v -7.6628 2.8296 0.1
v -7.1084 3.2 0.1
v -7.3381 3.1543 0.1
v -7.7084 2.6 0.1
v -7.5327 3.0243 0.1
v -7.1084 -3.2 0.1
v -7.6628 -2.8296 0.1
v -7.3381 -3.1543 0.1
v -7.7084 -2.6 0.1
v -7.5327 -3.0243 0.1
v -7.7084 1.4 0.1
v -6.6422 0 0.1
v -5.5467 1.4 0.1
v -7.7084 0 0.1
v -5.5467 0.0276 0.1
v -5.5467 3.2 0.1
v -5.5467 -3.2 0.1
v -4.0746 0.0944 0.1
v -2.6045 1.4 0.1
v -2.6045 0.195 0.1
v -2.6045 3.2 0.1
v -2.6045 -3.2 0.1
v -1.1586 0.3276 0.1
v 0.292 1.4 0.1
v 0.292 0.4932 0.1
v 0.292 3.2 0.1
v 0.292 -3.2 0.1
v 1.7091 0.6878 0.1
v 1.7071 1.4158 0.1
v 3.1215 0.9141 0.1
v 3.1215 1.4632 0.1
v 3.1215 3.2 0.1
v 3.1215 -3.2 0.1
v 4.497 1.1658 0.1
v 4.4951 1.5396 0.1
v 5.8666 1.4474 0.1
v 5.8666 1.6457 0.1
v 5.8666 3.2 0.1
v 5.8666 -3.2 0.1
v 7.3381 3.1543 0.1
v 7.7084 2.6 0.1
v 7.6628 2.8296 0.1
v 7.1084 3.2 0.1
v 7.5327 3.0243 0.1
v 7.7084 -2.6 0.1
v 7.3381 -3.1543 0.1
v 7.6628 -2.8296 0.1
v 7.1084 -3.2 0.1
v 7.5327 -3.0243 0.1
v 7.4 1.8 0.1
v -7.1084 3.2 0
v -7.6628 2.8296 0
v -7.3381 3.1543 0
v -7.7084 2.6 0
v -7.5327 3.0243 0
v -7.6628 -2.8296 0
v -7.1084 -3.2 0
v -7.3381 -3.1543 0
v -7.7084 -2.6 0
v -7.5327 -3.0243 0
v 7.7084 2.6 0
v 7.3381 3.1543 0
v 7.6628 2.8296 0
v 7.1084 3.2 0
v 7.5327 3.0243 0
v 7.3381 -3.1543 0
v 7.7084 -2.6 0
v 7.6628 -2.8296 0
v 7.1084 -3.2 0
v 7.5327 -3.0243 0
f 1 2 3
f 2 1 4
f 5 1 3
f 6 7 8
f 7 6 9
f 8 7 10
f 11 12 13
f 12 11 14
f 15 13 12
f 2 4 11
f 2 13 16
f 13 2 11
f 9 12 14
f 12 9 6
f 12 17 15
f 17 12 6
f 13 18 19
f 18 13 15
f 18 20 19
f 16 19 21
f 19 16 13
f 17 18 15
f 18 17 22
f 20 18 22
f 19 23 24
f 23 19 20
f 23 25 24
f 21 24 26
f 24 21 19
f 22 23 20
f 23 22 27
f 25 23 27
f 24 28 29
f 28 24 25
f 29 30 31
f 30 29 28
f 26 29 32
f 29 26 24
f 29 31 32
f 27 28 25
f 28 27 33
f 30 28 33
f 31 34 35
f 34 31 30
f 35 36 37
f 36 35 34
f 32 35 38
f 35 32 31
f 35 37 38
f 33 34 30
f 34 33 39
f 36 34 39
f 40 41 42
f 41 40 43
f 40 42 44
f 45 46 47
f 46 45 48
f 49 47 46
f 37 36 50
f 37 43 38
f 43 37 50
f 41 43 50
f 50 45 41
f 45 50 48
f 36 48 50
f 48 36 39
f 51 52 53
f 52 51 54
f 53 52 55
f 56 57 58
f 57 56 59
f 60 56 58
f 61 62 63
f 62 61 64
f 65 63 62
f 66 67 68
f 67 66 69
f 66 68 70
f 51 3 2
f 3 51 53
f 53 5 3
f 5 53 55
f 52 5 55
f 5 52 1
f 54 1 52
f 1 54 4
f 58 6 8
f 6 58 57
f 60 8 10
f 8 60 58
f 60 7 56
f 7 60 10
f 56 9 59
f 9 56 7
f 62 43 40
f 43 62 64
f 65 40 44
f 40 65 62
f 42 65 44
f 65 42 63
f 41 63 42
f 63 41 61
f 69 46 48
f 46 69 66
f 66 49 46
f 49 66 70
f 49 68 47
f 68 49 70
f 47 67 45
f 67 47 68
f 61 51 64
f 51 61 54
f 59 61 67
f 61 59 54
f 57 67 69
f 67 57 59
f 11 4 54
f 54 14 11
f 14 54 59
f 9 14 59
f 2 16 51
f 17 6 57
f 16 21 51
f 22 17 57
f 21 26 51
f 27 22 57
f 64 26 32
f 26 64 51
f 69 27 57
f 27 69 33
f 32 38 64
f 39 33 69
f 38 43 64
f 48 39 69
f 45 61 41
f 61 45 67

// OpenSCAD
// file: ../p/1-4cyli.scad
use <../lib.scad>
function ldraw_lib__1_4cyli() = [
// 0 Cylinder 0.25
// 0 Name: 1-4cyli.dat
// 0 Author: James Jessiman
// 0 !LDRAW_ORG Primitive UPDATE 2012-01
// 0 !LICENSE Licensed under CC BY 4.0 : see CAreadme.txt
// 
// 0 BFC CERTIFY CCW
  [0,"BFC","CERTIFY"],
  [0,"BFC","CCW"],
// 
// 0 !HISTORY 2002-03-23 [sbliss] Added BFC statement.
// 0 !HISTORY 2002-04-25 [PTadmin] Official Update 2002-02
// 0 !HISTORY 2007-06-22 [PTadmin] Header formatted for Contributor Agreement
// 0 !HISTORY 2008-07-01 [PTadmin] Official Update 2008-01
// 0 !HISTORY 2012-02-16 [Philo] Changed to CCW
// 0 !HISTORY 2012-03-30 [PTadmin] Official Update 2012-01
// 
// 
// 4 16 1 1 0 0.9239 1 0.3827 0.9239 0 0.3827 1 0 0
  [4,16,1,1,0,0.9239,1,0.3827,0.9239,0,0.3827,1,0,0],
// 5 24 1 0 0 1 1 0 0.9239 0 0.3827 1 0 -1
  [5,24,1,0,0,1,1,0,0.9239,0,0.3827,1,0,-1],
// 4 16 0.9239 1 0.3827 0.7071 1 0.7071 0.7071 0 0.7071 0.9239 0 0.3827
  [4,16,0.9239,1,0.3827,0.7071,1,0.7071,0.7071,0,0.7071,0.9239,0,0.3827],
// 5 24 0.9239 0 0.3827 0.9239 1 0.3827 0.7071 0 0.7071 1 0 0
  [5,24,0.9239,0,0.3827,0.9239,1,0.3827,0.7071,0,0.7071,1,0,0],
// 4 16 0.7071 1 0.7071 0.3827 1 0.9239 0.3827 0 0.9239 0.7071 0 0.7071
  [4,16,0.7071,1,0.7071,0.3827,1,0.9239,0.3827,0,0.9239,0.7071,0,0.7071],
// 5 24 0.7071 0 0.7071 0.7071 1 0.7071 0.3827 0 0.9239 0.9239 0 0.3827
  [5,24,0.7071,0,0.7071,0.7071,1,0.7071,0.3827,0,0.9239,0.9239,0,0.3827],
// 4 16 0.3827 1 0.9239 0 1 1 0 0 1 0.3827 0 0.9239
  [4,16,0.3827,1,0.9239,0,1,1,0,0,1,0.3827,0,0.9239],
// 5 24 0.3827 0 0.9239 0.3827 1 0.9239 0 0 1 0.7071 0 0.7071
  [5,24,0.3827,0,0.9239,0.3827,1,0.9239,0,0,1,0.7071,0,0.7071],
// 5 24 0 0 1 0 1 1 0.3827 0 0.9239 -1 0 1
  [5,24,0,0,1,0,1,1,0.3827,0,0.9239,-1,0,1],
];
module ldraw_lib__1_4cyli(step=0, col=false, unit=2/5, alt=false, line=0.2, solid=!$preview)
    makepoly(ldraw_lib__1_4cyli(), step=step, col=col, unit=unit, alt=alt, line=line, solid=solid);
ldraw_lib__1_4cyli(line=0.2);
// file: ../p/1-4chrd.scad
use <../lib.scad>
function ldraw_lib__1_4chrd() = [
// 0 Chord 0.25
// 0 Name: 1-4chrd.dat
// 0 Author: Tony Hafner [hafhead]
// 0 !LDRAW_ORG Primitive UPDATE 2012-02
// 0 !LICENSE Licensed under CC BY 2.0 and CC BY 4.0 : see CAreadme.txt
// 
// 0 BFC CERTIFY CCW
  [0,"BFC","CERTIFY"],
  [0,"BFC","CCW"],
// 
// 0 !HISTORY 2004-04-22 [PTadmin] Official Update 2004-02
// 0 !HISTORY 2007-10-09 [PTadmin] Header formatted for Contributor Agreement
// 0 !HISTORY 2008-07-01 [PTadmin] Official Update 2008-01
// 0 !HISTORY 2012-08-02 [MMR1988] Re-creation with PrimGen2 and Rectifier
// 0 !HISTORY 2012-08-09 [PTadmin] Official Update 2012-02
// 
// 
// 4 16 0.9239 0 0.3827 0.3827 0 0.9239 0 0 1 1 0 0
  [4,16,0.9239,0,0.3827,0.3827,0,0.9239,0,0,1,1,0,0],
// 3 16 0.7071 0 0.7071 0.3827 0 0.9239 0.9239 0 0.3827
  [3,16,0.7071,0,0.7071,0.3827,0,0.9239,0.9239,0,0.3827],
];
module ldraw_lib__1_4chrd(step=0, col=false, unit=2/5, alt=false, line=0.2, solid=!$preview)
    makepoly(ldraw_lib__1_4chrd(), step=step, col=col, unit=unit, alt=alt, line=line, solid=solid);
ldraw_lib__1_4chrd(line=0.2);
// file: s/6142617fs07.scad
use <../../lib.scad>
use <../../p/1-4chrd.scad>
use <../../p/1-4cyli.scad>
function ldraw_lib__s__6142617fs07() = [
// 0 ~Sticker  0.8 x  1.9 with Black Arc on Red Background Left - Bottom Face
// 0 Name: s\6142617fs07.dat
// 0 Author: Massimo Maso [Sirio]
// 0 !LDRAW_ORG Subpart UPDATE 2023-04
// 0 !LICENSE Licensed under CC BY 4.0 : see CAreadme.txt
// 
// 0 BFC CERTIFY CCW
  [0,"BFC","CERTIFY"],
  [0,"BFC","CCW"],
// 
// 0 !HISTORY 2023-08-25 [OrionP] Official Update 2023-04
// 
// 
// 0 // Primitives
// 1 16 -6.5 0 17.7711 -1.5 0 0 0 -1 0 0 0 1.5 1-4chrd.dat
  [1,16,-6.5,0,17.7711,-1.5,0,0,0,-1,0,0,0,1.5, ldraw_lib__1_4chrd()],
// 1 16 6.5 0 17.7711 1.5 0 0 0 -1 0 0 0 1.5 1-4chrd.dat
  [1,16,6.5,0,17.7711,1.5,0,0,0,-1,0,0,0,1.5, ldraw_lib__1_4chrd()],
// 1 16 -6.5 0 -17.7711 -1.5 0 0 0 -1 0 0 0 -1.5 1-4chrd.dat
  [1,16,-6.5,0,-17.7711,-1.5,0,0,0,-1,0,0,0,-1.5, ldraw_lib__1_4chrd()],
// 1 16 6.5 0 -17.7711 1.5 0 0 0 -1 0 0 0 -1.5 1-4chrd.dat
  [1,16,6.5,0,-17.7711,1.5,0,0,0,-1,0,0,0,-1.5, ldraw_lib__1_4chrd()],
// 1 16 -6.5 -0.25 17.7711 -1.5 0 0 0 0.25 0 0 0 1.5 1-4cyli.dat
  [1,16,-6.5,-0.25,17.7711,-1.5,0,0,0,0.25,0,0,0,1.5, ldraw_lib__1_4cyli()],
// 1 16 6.5 -0.25 17.7711 1.5 0 0 0 0.25 0 0 0 1.5 1-4cyli.dat
  [1,16,6.5,-0.25,17.7711,1.5,0,0,0,0.25,0,0,0,1.5, ldraw_lib__1_4cyli()],
// 1 16 -6.5 -0.25 -17.7711 -1.5 0 0 0 0.25 0 0 0 -1.5 1-4cyli.dat
  [1,16,-6.5,-0.25,-17.7711,-1.5,0,0,0,0.25,0,0,0,-1.5, ldraw_lib__1_4cyli()],
// 1 16 6.5 -0.25 -17.7711 1.5 0 0 0 0.25 0 0 0 -1.5 1-4cyli.dat
  [1,16,6.5,-0.25,-17.7711,1.5,0,0,0,0.25,0,0,0,-1.5, ldraw_lib__1_4cyli()],
// 0 // Bottom face
// 4 16 -6.5 0 19.2711 -6.5 0 -19.2711 -8 0 -17.7711 -8 0 17.7711
  [4,16,-6.5,0,19.2711,-6.5,0,-19.2711,-8,0,-17.7711,-8,0,17.7711],
// 4 16 -6.5 0 19.2711 6.5 0 19.2711 6.5 0 -19.2711 -6.5 0 -19.2711
  [4,16,-6.5,0,19.2711,6.5,0,19.2711,6.5,0,-19.2711,-6.5,0,-19.2711],
// 4 16 6.5 0 19.2711 8 0 17.7711 8 0 -17.7711 6.5 0 -19.2711
  [4,16,6.5,0,19.2711,8,0,17.7711,8,0,-17.7711,6.5,0,-19.2711],
// 0 // Lateral face
// 3 16 -6.5 0 19.2711 -6.5 -.25 19.2711 -3.5 -.25 19.2711
  [3,16,-6.5,0,19.2711,-6.5,-.25,19.2711,-3.5,-.25,19.2711],
// 4 16 -6.5 0 19.2711 -3.5 -.25 19.2711 0 -.25 19.2711 6.5 0 19.2711
  [4,16,-6.5,0,19.2711,-3.5,-.25,19.2711,0,-.25,19.2711,6.5,0,19.2711],
// 3 16 6.5 0 19.2711 0 -.25 19.2711 6.5 -.25 19.2711
  [3,16,6.5,0,19.2711,0,-.25,19.2711,6.5,-.25,19.2711],
// 3 16 -8 0 17.7711 -8 -.25 13.8668 -8 -.25 17.7711
  [3,16,-8,0,17.7711,-8,-.25,13.8668,-8,-.25,17.7711],
// 3 16 8 0 17.7711 8 -.25 17.7711 8 -.25 13.8668
  [3,16,8,0,17.7711,8,-.25,17.7711,8,-.25,13.8668],
// 3 16 -8 0 17.7711 -8 -.25 6.5112 -8 -.25 13.8668
  [3,16,-8,0,17.7711,-8,-.25,6.5112,-8,-.25,13.8668],
// 3 16 8 0 17.7711 8 -.25 13.8668 8 -.25 6.5112
  [3,16,8,0,17.7711,8,-.25,13.8668,8,-.25,6.5112],
// 3 16 -8 0 17.7711 -8 -.25 -.73 -8 -.25 6.5112
  [3,16,-8,0,17.7711,-8,-.25,-.73,-8,-.25,6.5112],
// 3 16 8 0 17.7711 8 -.25 6.5112 8 -.25 -.73
  [3,16,8,0,17.7711,8,-.25,6.5112,8,-.25,-.73],
// 4 16 -8 0 17.7711 -8 0 -17.7711 -8 -.25 -7.8038 -8 -.25 -.73
  [4,16,-8,0,17.7711,-8,0,-17.7711,-8,-.25,-7.8038,-8,-.25,-.73],
// 4 16 8 0 17.7711 8 -.25 -.73 8 -.25 -7.8038 8 0 -17.7711
  [4,16,8,0,17.7711,8,-.25,-.73,8,-.25,-7.8038,8,0,-17.7711],
// 3 16 -8 0 -17.7711 -8 -.25 -14.6666 -8 -.25 -7.8038
  [3,16,-8,0,-17.7711,-8,-.25,-14.6666,-8,-.25,-7.8038],
// 3 16 8 0 -17.7711 8 -.25 -7.8038 8 -.25 -14.6666
  [3,16,8,0,-17.7711,8,-.25,-7.8038,8,-.25,-14.6666],
// 3 16 -8 0 -17.7711 -8 -.25 -17.7711 -8 -.25 -14.6666
  [3,16,-8,0,-17.7711,-8,-.25,-17.7711,-8,-.25,-14.6666],
// 3 16 8 0 -17.7711 8 -.25 -14.6666 8 -.25 -17.7711
  [3,16,8,0,-17.7711,8,-.25,-14.6666,8,-.25,-17.7711],
// 4 16 -6.5 0 -19.2711 6.5 0 -19.2711 6.5 -.25 -19.2711 -6.5 -.25 -19.2711
  [4,16,-6.5,0,-19.2711,6.5,0,-19.2711,6.5,-.25,-19.2711,-6.5,-.25,-19.2711],
];
module ldraw_lib__s__6142617fs07(step=0, col=false, unit=2/5, alt=false, line=0.2, solid=!$preview)
    makepoly(ldraw_lib__s__6142617fs07(), step=step, col=col, unit=unit, alt=alt, line=line, solid=solid);
ldraw_lib__s__6142617fs07(line=0.2);
// file: s/6142617fs06.scad
use <../../lib.scad>
use <../../p/1-4chrd.scad>
function ldraw_lib__s__6142617fs06() = [
// 0 ~Sticker  0.8 x  1.9 with Black Arc on Red Background Left - Sixth Face
// 0 Name: s\6142617fs06.dat
// 0 Author: Massimo Maso [Sirio]
// 0 !LDRAW_ORG Subpart UPDATE 2023-04
// 0 !LICENSE Licensed under CC BY 4.0 : see CAreadme.txt
// 
// 0 BFC CERTIFY CCW
  [0,"BFC","CERTIFY"],
  [0,"BFC","CCW"],
// 
// 0 !HISTORY 2023-08-25 [OrionP] Official Update 2023-04
// 
// 
// 0 // Primitives
// 1 4 -6.5 -.25 -3.0901 -1.5 0 0 0 1 0 0 0 -1.5 1-4chrd.dat
  [1,4,-6.5,-.25,-3.0901,-1.5,0,0,0,1,0,0,0,-1.5, ldraw_lib__1_4chrd()],
// 1 4 6.5 -.25 -3.0901 1.5 0 0 0 1 0 0 0 -1.5 1-4chrd.dat
  [1,4,6.5,-.25,-3.0901,1.5,0,0,0,1,0,0,0,-1.5, ldraw_lib__1_4chrd()],
// 0 // Black faces
// 3 0 -4.5 -.25 -3.819 -3.6185 -.25 .0144 -4.1143 -.25 .0144
  [3,0,-4.5,-.25,-3.819,-3.6185,-.25,.0144,-4.1143,-.25,.0144],
// 0 // Red faces
// 4 4 -4.5 -.25 -3.819 -4.1143 -.25 .0144 -8 -.25 .0144 -8 -.25 -3.0901
  [4,4,-4.5,-.25,-3.819,-4.1143,-.25,.0144,-8,-.25,.0144,-8,-.25,-3.0901],
// 3 4 -4.5 -.25 -3.819 -8 -.25 -3.0901 -6.5 -.25 -4.5901
  [3,4,-4.5,-.25,-3.819,-8,-.25,-3.0901,-6.5,-.25,-4.5901],
// 4 4 -4.5 -.25 -3.819 -6.5 -.25 -4.5901 6.5 -.25 -4.5901 8 -.25 -3.0901
  [4,4,-4.5,-.25,-3.819,-6.5,-.25,-4.5901,6.5,-.25,-4.5901,8,-.25,-3.0901],
// 4 4 -4.5 -.25 -3.819 8 -.25 -3.0901 8 -.25 .0144 -3.6185 -.25 .0144
  [4,4,-4.5,-.25,-3.819,8,-.25,-3.0901,8,-.25,.0144,-3.6185,-.25,.0144],
];
module ldraw_lib__s__6142617fs06(step=0, col=false, unit=2/5, alt=false, line=0.2, solid=!$preview)
    makepoly(ldraw_lib__s__6142617fs06(), step=step, col=col, unit=unit, alt=alt, line=line, solid=solid);
ldraw_lib__s__6142617fs06(line=0.2);
// file: s/6142617fs05.scad
use <../../lib.scad>
function ldraw_lib__s__6142617fs05() = [
// 0 ~Sticker  0.8 x  1.9 with Black Arc on Red Background Left - Fifth Face
// 0 Name: s\6142617fs05.dat
// 0 Author: Massimo Maso [Sirio]
// 0 !LDRAW_ORG Subpart UPDATE 2023-04
// 0 !LICENSE Licensed under CC BY 4.0 : see CAreadme.txt
// 
// 0 BFC CERTIFY CCW
  [0,"BFC","CERTIFY"],
  [0,"BFC","CCW"],
// 
// 0 !HISTORY 2023-08-25 [OrionP] Official Update 2023-04
// 
// 
// 0 // Black faces
// 4 0 -3.8489 -.25 3.4145 -2.9144 -.25 3.4097 -2.2852 -.25 6.8484 -3.658 -.25 6.8484
  [4,0,-3.8489,-.25,3.4145,-2.9144,-.25,3.4097,-2.2852,-.25,6.8484,-3.658,-.25,6.8484],
// 4 0 -3.8489 -.25 3.4145 -4.1143 -.25 -.0144 -3.6185 -.25 -.0144 -2.9144 -.25 3.4097
  [4,0,-3.8489,-.25,3.4145,-4.1143,-.25,-.0144,-3.6185,-.25,-.0144,-2.9144,-.25,3.4097],
// 0 // Red faces
// 4 4 -8 -.25 -.0144 -3.8489 -.25 3.4145 -3.658 -.25 6.8484 -8 -.25 6.8484
  [4,4,-8,-.25,-.0144,-3.8489,-.25,3.4145,-3.658,-.25,6.8484,-8,-.25,6.8484],
// 3 4 -8 -.25 -.0144 -4.1143 -.25 -.0144 -3.8489 -.25 3.4145
  [3,4,-8,-.25,-.0144,-4.1143,-.25,-.0144,-3.8489,-.25,3.4145],
// 4 4 8 -.25 -.0144 8 -.25 6.8484 -2.2852 -.25 6.8484 -2.9144 -.25 3.4097
  [4,4,8,-.25,-.0144,8,-.25,6.8484,-2.2852,-.25,6.8484,-2.9144,-.25,3.4097],
// 3 4 8 -.25 -.0144 -2.9144 -.25 3.4097 -3.6185 -.25 -.0144
  [3,4,8,-.25,-.0144,-2.9144,-.25,3.4097,-3.6185,-.25,-.0144],
];
module ldraw_lib__s__6142617fs05(step=0, col=false, unit=2/5, alt=false, line=0.2, solid=!$preview)
    makepoly(ldraw_lib__s__6142617fs05(), step=step, col=col, unit=unit, alt=alt, line=line, solid=solid);
ldraw_lib__s__6142617fs05(line=0.2);
// file: s/6142617fs04.scad
use <../../lib.scad>
function ldraw_lib__s__6142617fs04() = [
// 0 ~Sticker  0.8 x  1.9 with Black Arc on Red Background Left - Fourth Face
// 0 Name: s\6142617fs04.dat
// 0 Author: Massimo Maso [Sirio]
// 0 !LDRAW_ORG Subpart UPDATE 2023-04
// 0 !LICENSE Licensed under CC BY 4.0 : see CAreadme.txt
// 
// 0 BFC CERTIFY CCW
  [0,"BFC","CERTIFY"],
  [0,"BFC","CCW"],
// 
// 0 !HISTORY 2023-08-25 [OrionP] Official Update 2023-04
// 
// 
// 0 // Black faces
// 
// 4 0 -3.5395 -.25 -3.525 -1.7195 -.25 -3.53 -1.2329 -.25 .0128 -3.5 -.25 .0128
  [4,0,-3.5395,-.25,-3.525,-1.7195,-.25,-3.53,-1.2329,-.25,.0128,-3.5,-.25,.0128],
// 4 0 -3.5395 -.25 -3.525 -3.658 -.25 -7.061 -2.2852 -.25 -7.061 -1.7195 -.25 -3.53
  [4,0,-3.5395,-.25,-3.525,-3.658,-.25,-7.061,-2.2852,-.25,-7.061,-1.7195,-.25,-3.53],
// 0 // Red faces
// 4 4 -8 -.25 -7.061 -3.5395 -.25 -3.525 -3.5 -.25 .0128 -8 -.25 .0128
  [4,4,-8,-.25,-7.061,-3.5395,-.25,-3.525,-3.5,-.25,.0128,-8,-.25,.0128],
// 3 4 -8 -.25 -7.061 -3.658 -.25 -7.061 -3.5395 -.25 -3.525
  [3,4,-8,-.25,-7.061,-3.658,-.25,-7.061,-3.5395,-.25,-3.525],
// 4 4 8 -.25 -7.061 8 -.25 .0128 -1.2329 -.25 .0128 -1.7195 -.25 -3.53
  [4,4,8,-.25,-7.061,8,-.25,.0128,-1.2329,-.25,.0128,-1.7195,-.25,-3.53],
// 3 4 8 -.25 -7.061 -1.7195 -.25 -3.53 -2.2852 -.25 -7.061
  [3,4,8,-.25,-7.061,-1.7195,-.25,-3.53,-2.2852,-.25,-7.061],
];
module ldraw_lib__s__6142617fs04(step=0, col=false, unit=2/5, alt=false, line=0.2, solid=!$preview)
    makepoly(ldraw_lib__s__6142617fs04(), step=step, col=col, unit=unit, alt=alt, line=line, solid=solid);
ldraw_lib__s__6142617fs04(line=0.2);
// file: s/6142617fs03.scad
use <../../lib.scad>
function ldraw_lib__s__6142617fs03() = [
// 0 ~Sticker  0.8 x  1.9 with Black Arc on Red Background Left - Third Face
// 0 Name: s\6142617fs03.dat
// 0 Author: Massimo Maso [Sirio]
// 0 !LDRAW_ORG Subpart UPDATE 2023-04
// 0 !LICENSE Licensed under CC BY 4.0 : see CAreadme.txt
// 
// 0 BFC CERTIFY CCW
  [0,"BFC","CERTIFY"],
  [0,"BFC","CCW"],
// 
// 0 !HISTORY 2023-08-25 [OrionP] Official Update 2023-04
// 
// 
// 0 // Black faces
// 
// 4 0 -3.5 -.25 -.0128 -.8189 -.25 3.6136 -.4874 -.25 7.2284 -3.5 -.25 7.2284
  [4,0,-3.5,-.25,-.0128,-.8189,-.25,3.6136,-.4874,-.25,7.2284,-3.5,-.25,7.2284],
// 3 0 -3.5 -.25 -.0128 -1.2329 -.25 -.0128 -.8189 -.25 3.6136
  [3,0,-3.5,-.25,-.0128,-1.2329,-.25,-.0128,-.8189,-.25,3.6136],
// 0 // Red faces
// 4 4 -8 -.25 7.2284 -8 -.25 -.0128 -3.5 -.25 -.0128 -3.5 -.25 7.2284
  [4,4,-8,-.25,7.2284,-8,-.25,-.0128,-3.5,-.25,-.0128,-3.5,-.25,7.2284],
// 4 4 -.4874 -.25 7.2284 -.8189 -.25 3.6136 8 -.25 -.0128 8 -.25 7.2284
  [4,4,-.4874,-.25,7.2284,-.8189,-.25,3.6136,8,-.25,-.0128,8,-.25,7.2284],
// 3 4 8 -.25 -.0128 -.8189 -.25 3.6136 -1.2329 -.25 -.0128
  [3,4,8,-.25,-.0128,-.8189,-.25,3.6136,-1.2329,-.25,-.0128],
];
module ldraw_lib__s__6142617fs03(step=0, col=false, unit=2/5, alt=false, line=0.2, solid=!$preview)
    makepoly(ldraw_lib__s__6142617fs03(), step=step, col=col, unit=unit, alt=alt, line=line, solid=solid);
ldraw_lib__s__6142617fs03(line=0.2);
// file: s/6142617fs02.scad
use <../../lib.scad>
function ldraw_lib__s__6142617fs02() = [
// 0 ~Sticker  0.8 x  1.9 with Black Arc on Red Background Left - Second Face
// 0 Name: s\6142617fs02.dat
// 0 Author: Massimo Maso [Sirio]
// 0 !LDRAW_ORG Subpart UPDATE 2023-04
// 0 !LICENSE Licensed under CC BY 4.0 : see CAreadme.txt
// 
// 0 BFC CERTIFY CCW
  [0,"BFC","CERTIFY"],
  [0,"BFC","CCW"],
// 
// 0 !HISTORY 2023-08-25 [OrionP] Official Update 2023-04
// 
// 
// 0 // Black faces
// 
// 4 0 -3.5 -.25 -7.3435 -.2359 -.25 -3.6681 -.0691 -.25 .0121 -3.5 -.25 .0121
  [4,0,-3.5,-.25,-7.3435,-.2359,-.25,-3.6681,-.0691,-.25,.0121,-3.5,-.25,.0121],
// 3 0 -3.5 -.25 -7.3435 -.4874 -.25 -7.3435 -.2359 -.25 -3.6681
  [3,0,-3.5,-.25,-7.3435,-.4874,-.25,-7.3435,-.2359,-.25,-3.6681],
// 0 // Red faces
// 4 4 -8 -.25 .0121 -8 -.25 -7.3435 -3.5 -.25 -7.3435 -3.5 -.25 .0121
  [4,4,-8,-.25,.0121,-8,-.25,-7.3435,-3.5,-.25,-7.3435,-3.5,-.25,.0121],
// 4 4 -.0691 -.25 .0121 -.2359 -.25 -3.6681 8 -.25 -7.3435 8 -.25 .0121
  [4,4,-.0691,-.25,.0121,-.2359,-.25,-3.6681,8,-.25,-7.3435,8,-.25,.0121],
// 3 4 8 -.25 -7.3435 -.2359 -.25 -3.6681 -.4874 -.25 -7.3435
  [3,4,8,-.25,-7.3435,-.2359,-.25,-3.6681,-.4874,-.25,-7.3435],
];
module ldraw_lib__s__6142617fs02(step=0, col=false, unit=2/5, alt=false, line=0.2, solid=!$preview)
    makepoly(ldraw_lib__s__6142617fs02(), step=step, col=col, unit=unit, alt=alt, line=line, solid=solid);
ldraw_lib__s__6142617fs02(line=0.2);
// file: s/6142617fs01.scad
use <../../lib.scad>
use <../../p/1-4chrd.scad>
function ldraw_lib__s__6142617fs01() = [
// 0 ~Sticker  0.8 x  1.9 with Black Arc on Red Background Left - First Face
// 0 Name: s\6142617fs01.dat
// 0 Author: Massimo Maso [Sirio]
// 0 !LDRAW_ORG Subpart UPDATE 2023-04
// 0 !LICENSE Licensed under CC BY 4.0 : see CAreadme.txt
// 
// 0 BFC CERTIFY CCW
  [0,"BFC","CERTIFY"],
  [0,"BFC","CCW"],
// 
// 0 !HISTORY 2023-08-25 [OrionP] Official Update 2023-04
// 
// 
// 0 // Primitives
// 1 4 -6.5 -.25 3.8922 -1.5 0 0 0 1 0 0 0 1.5 1-4chrd.dat
  [1,4,-6.5,-.25,3.8922,-1.5,0,0,0,1,0,0,0,1.5, ldraw_lib__1_4chrd()],
// 1 4 6.5 -.25 3.8922 1.5 0 0 0 1 0 0 0 1.5 1-4chrd.dat
  [1,4,6.5,-.25,3.8922,1.5,0,0,0,1,0,0,0,1.5, ldraw_lib__1_4chrd()],
// 0 // Black faces
// 4 0 0 -.25 2.7265 0 -.25 5.3922 -3.5 -.25 5.3922 -3.5 -.25 -.0121
  [4,0,0,-.25,2.7265,0,-.25,5.3922,-3.5,-.25,5.3922,-3.5,-.25,-.0121],
// 3 0 0 -.25 2.7265 -3.5 -.25 -.0121 -.0691 -.25 -.0121
  [3,0,0,-.25,2.7265,-3.5,-.25,-.0121,-.0691,-.25,-.0121],
// 0 // Red faces
// 3 4 -3.5 -.25 5.3922 -6.5 -.25 5.3922 -8 -.25 3.8922
  [3,4,-3.5,-.25,5.3922,-6.5,-.25,5.3922,-8,-.25,3.8922],
// 4 4 -3.5 -.25 5.3922 -8 -.25 3.8922 -8 -.25 -.0121 -3.5 -.25 -.0121
  [4,4,-3.5,-.25,5.3922,-8,-.25,3.8922,-8,-.25,-.0121,-3.5,-.25,-.0121],
// 4 4 0 -.25 5.3922 0 -.25 2.7265 8 -.25 3.8922 6.5 -.25 5.3922
  [4,4,0,-.25,5.3922,0,-.25,2.7265,8,-.25,3.8922,6.5,-.25,5.3922],
// 4 4 0 -.25 2.7265 -.0691 -.25 -.0121 8 -.25 -.0121 8 -.25 3.8922
  [4,4,0,-.25,2.7265,-.0691,-.25,-.0121,8,-.25,-.0121,8,-.25,3.8922],
];
module ldraw_lib__s__6142617fs01(step=0, col=false, unit=2/5, alt=false, line=0.2, solid=!$preview)
    makepoly(ldraw_lib__s__6142617fs01(), step=step, col=col, unit=unit, alt=alt, line=line, solid=solid);
ldraw_lib__s__6142617fs01(line=0.2);
// file: 6142617f.scad
use <../lib.scad>
use <s/6142617fs01.scad>
use <s/6142617fs02.scad>
use <s/6142617fs03.scad>
use <s/6142617fs04.scad>
use <s/6142617fs05.scad>
use <s/6142617fs06.scad>
use <s/6142617fs07.scad>
function ldraw_lib__6142617f() = [
// 0 Sticker  0.8 x  1.9 with Black Arc on Red Background Left
// 0 Name: 6142617f.dat
// 0 Author: Massimo Maso [Sirio]
// 0 !LDRAW_ORG Part UPDATE 2023-04
// 0 !LICENSE Licensed under CC BY 4.0 : see CAreadme.txt
// 
// 0 BFC CERTIFY CCW
  [0,"BFC","CERTIFY"],
  [0,"BFC","CCW"],
// 
// 0 !KEYWORDS Camaro, Chevrolet, Drag, Race, Set 75874, Speed Champions, SS
// 
// 0 !HISTORY 2023-08-25 [OrionP] Official Update 2023-04
// 
// 
// 1 16 13.8789 0 0 0 0 1 0 1 0 -1 0 0 s\6142617fs01.dat
  [1,16,13.8789,0,0,0,0,1,0,1,0,-1,0,0, ldraw_lib__s__6142617fs01()],
// 1 16 13.8547 0 0 0 0 1 0 1 0 -1 0 0 s\6142617fs02.dat
  [1,16,13.8547,0,0,0,0,1,0,1,0,-1,0,0, ldraw_lib__s__6142617fs02()],
// 1 16 -.7172 0 0 0 0 1 0 1 0 -1 0 0 s\6142617fs03.dat
  [1,16,-.7172,0,0,0,0,1,0,1,0,-1,0,0, ldraw_lib__s__6142617fs03()],
// 1 16 -.7428 0 0 0 0 1 0 1 0 -1 0 0 s\6142617fs04.dat
  [1,16,-.7428,0,0,0,0,1,0,1,0,-1,0,0, ldraw_lib__s__6142617fs04()],
// 1 16 -14.6522 0 0 0 0 1 0 1 0 -1 0 0 s\6142617fs05.dat
  [1,16,-14.6522,0,0,0,0,1,0,1,0,-1,0,0, ldraw_lib__s__6142617fs05()],
// 1 16 -14.681 0 0 0 0 1 0 1 0 -1 0 0 s\6142617fs06.dat
  [1,16,-14.681,0,0,0,0,1,0,1,0,-1,0,0, ldraw_lib__s__6142617fs06()],
// 1 16 0 0 0 0 0 1 0 1 0 -1 0 0 s\6142617fs07.dat
  [1,16,0,0,0,0,0,1,0,1,0,-1,0,0, ldraw_lib__s__6142617fs07()],
];
module ldraw_lib__6142617f(step=0, col=false, unit=2/5, alt=false, line=0.2, solid=!$preview)
    makepoly(ldraw_lib__6142617f(), step=step, col=col, unit=unit, alt=alt, line=line, solid=solid);
ldraw_lib__6142617f(line=0.2);
// main file
use <../lib.scad>
use <6142617f.scad>
function ldraw_lib__6142617g() = [
// 0 Sticker  0.8 x  1.9 with Black Arc on Red Background Right
// 0 Name: 6142617g.dat
// 0 Author: Massimo Maso [Sirio]
// 0 !LDRAW_ORG Part UPDATE 2023-04
// 0 !LICENSE Licensed under CC BY 4.0 : see CAreadme.txt
// 
// 0 BFC CERTIFY CCW
  [0,"BFC","CERTIFY"],
  [0,"BFC","CCW"],
// 
// 0 !KEYWORDS Camaro, Chevrolet, Drag, Race, Set 75874, Speed Champions, SS
// 
// 0 !HISTORY 2023-08-25 [OrionP] Official Update 2023-04
// 
// 
// 1 16 0 0 0 -1 0 0 0 1 0 0 0 1 6142617f.dat
  [1,16,0,0,0,-1,0,0,0,1,0,0,0,1, ldraw_lib__6142617f()],
];
module ldraw_lib__6142617g(step=0, col=false, unit=2/5, alt=false, line=0.2, solid=!$preview)
    makepoly(ldraw_lib__6142617g(), step=step, col=col, unit=unit, alt=alt, line=line, solid=solid);
ldraw_lib__6142617g(line=0.2);
